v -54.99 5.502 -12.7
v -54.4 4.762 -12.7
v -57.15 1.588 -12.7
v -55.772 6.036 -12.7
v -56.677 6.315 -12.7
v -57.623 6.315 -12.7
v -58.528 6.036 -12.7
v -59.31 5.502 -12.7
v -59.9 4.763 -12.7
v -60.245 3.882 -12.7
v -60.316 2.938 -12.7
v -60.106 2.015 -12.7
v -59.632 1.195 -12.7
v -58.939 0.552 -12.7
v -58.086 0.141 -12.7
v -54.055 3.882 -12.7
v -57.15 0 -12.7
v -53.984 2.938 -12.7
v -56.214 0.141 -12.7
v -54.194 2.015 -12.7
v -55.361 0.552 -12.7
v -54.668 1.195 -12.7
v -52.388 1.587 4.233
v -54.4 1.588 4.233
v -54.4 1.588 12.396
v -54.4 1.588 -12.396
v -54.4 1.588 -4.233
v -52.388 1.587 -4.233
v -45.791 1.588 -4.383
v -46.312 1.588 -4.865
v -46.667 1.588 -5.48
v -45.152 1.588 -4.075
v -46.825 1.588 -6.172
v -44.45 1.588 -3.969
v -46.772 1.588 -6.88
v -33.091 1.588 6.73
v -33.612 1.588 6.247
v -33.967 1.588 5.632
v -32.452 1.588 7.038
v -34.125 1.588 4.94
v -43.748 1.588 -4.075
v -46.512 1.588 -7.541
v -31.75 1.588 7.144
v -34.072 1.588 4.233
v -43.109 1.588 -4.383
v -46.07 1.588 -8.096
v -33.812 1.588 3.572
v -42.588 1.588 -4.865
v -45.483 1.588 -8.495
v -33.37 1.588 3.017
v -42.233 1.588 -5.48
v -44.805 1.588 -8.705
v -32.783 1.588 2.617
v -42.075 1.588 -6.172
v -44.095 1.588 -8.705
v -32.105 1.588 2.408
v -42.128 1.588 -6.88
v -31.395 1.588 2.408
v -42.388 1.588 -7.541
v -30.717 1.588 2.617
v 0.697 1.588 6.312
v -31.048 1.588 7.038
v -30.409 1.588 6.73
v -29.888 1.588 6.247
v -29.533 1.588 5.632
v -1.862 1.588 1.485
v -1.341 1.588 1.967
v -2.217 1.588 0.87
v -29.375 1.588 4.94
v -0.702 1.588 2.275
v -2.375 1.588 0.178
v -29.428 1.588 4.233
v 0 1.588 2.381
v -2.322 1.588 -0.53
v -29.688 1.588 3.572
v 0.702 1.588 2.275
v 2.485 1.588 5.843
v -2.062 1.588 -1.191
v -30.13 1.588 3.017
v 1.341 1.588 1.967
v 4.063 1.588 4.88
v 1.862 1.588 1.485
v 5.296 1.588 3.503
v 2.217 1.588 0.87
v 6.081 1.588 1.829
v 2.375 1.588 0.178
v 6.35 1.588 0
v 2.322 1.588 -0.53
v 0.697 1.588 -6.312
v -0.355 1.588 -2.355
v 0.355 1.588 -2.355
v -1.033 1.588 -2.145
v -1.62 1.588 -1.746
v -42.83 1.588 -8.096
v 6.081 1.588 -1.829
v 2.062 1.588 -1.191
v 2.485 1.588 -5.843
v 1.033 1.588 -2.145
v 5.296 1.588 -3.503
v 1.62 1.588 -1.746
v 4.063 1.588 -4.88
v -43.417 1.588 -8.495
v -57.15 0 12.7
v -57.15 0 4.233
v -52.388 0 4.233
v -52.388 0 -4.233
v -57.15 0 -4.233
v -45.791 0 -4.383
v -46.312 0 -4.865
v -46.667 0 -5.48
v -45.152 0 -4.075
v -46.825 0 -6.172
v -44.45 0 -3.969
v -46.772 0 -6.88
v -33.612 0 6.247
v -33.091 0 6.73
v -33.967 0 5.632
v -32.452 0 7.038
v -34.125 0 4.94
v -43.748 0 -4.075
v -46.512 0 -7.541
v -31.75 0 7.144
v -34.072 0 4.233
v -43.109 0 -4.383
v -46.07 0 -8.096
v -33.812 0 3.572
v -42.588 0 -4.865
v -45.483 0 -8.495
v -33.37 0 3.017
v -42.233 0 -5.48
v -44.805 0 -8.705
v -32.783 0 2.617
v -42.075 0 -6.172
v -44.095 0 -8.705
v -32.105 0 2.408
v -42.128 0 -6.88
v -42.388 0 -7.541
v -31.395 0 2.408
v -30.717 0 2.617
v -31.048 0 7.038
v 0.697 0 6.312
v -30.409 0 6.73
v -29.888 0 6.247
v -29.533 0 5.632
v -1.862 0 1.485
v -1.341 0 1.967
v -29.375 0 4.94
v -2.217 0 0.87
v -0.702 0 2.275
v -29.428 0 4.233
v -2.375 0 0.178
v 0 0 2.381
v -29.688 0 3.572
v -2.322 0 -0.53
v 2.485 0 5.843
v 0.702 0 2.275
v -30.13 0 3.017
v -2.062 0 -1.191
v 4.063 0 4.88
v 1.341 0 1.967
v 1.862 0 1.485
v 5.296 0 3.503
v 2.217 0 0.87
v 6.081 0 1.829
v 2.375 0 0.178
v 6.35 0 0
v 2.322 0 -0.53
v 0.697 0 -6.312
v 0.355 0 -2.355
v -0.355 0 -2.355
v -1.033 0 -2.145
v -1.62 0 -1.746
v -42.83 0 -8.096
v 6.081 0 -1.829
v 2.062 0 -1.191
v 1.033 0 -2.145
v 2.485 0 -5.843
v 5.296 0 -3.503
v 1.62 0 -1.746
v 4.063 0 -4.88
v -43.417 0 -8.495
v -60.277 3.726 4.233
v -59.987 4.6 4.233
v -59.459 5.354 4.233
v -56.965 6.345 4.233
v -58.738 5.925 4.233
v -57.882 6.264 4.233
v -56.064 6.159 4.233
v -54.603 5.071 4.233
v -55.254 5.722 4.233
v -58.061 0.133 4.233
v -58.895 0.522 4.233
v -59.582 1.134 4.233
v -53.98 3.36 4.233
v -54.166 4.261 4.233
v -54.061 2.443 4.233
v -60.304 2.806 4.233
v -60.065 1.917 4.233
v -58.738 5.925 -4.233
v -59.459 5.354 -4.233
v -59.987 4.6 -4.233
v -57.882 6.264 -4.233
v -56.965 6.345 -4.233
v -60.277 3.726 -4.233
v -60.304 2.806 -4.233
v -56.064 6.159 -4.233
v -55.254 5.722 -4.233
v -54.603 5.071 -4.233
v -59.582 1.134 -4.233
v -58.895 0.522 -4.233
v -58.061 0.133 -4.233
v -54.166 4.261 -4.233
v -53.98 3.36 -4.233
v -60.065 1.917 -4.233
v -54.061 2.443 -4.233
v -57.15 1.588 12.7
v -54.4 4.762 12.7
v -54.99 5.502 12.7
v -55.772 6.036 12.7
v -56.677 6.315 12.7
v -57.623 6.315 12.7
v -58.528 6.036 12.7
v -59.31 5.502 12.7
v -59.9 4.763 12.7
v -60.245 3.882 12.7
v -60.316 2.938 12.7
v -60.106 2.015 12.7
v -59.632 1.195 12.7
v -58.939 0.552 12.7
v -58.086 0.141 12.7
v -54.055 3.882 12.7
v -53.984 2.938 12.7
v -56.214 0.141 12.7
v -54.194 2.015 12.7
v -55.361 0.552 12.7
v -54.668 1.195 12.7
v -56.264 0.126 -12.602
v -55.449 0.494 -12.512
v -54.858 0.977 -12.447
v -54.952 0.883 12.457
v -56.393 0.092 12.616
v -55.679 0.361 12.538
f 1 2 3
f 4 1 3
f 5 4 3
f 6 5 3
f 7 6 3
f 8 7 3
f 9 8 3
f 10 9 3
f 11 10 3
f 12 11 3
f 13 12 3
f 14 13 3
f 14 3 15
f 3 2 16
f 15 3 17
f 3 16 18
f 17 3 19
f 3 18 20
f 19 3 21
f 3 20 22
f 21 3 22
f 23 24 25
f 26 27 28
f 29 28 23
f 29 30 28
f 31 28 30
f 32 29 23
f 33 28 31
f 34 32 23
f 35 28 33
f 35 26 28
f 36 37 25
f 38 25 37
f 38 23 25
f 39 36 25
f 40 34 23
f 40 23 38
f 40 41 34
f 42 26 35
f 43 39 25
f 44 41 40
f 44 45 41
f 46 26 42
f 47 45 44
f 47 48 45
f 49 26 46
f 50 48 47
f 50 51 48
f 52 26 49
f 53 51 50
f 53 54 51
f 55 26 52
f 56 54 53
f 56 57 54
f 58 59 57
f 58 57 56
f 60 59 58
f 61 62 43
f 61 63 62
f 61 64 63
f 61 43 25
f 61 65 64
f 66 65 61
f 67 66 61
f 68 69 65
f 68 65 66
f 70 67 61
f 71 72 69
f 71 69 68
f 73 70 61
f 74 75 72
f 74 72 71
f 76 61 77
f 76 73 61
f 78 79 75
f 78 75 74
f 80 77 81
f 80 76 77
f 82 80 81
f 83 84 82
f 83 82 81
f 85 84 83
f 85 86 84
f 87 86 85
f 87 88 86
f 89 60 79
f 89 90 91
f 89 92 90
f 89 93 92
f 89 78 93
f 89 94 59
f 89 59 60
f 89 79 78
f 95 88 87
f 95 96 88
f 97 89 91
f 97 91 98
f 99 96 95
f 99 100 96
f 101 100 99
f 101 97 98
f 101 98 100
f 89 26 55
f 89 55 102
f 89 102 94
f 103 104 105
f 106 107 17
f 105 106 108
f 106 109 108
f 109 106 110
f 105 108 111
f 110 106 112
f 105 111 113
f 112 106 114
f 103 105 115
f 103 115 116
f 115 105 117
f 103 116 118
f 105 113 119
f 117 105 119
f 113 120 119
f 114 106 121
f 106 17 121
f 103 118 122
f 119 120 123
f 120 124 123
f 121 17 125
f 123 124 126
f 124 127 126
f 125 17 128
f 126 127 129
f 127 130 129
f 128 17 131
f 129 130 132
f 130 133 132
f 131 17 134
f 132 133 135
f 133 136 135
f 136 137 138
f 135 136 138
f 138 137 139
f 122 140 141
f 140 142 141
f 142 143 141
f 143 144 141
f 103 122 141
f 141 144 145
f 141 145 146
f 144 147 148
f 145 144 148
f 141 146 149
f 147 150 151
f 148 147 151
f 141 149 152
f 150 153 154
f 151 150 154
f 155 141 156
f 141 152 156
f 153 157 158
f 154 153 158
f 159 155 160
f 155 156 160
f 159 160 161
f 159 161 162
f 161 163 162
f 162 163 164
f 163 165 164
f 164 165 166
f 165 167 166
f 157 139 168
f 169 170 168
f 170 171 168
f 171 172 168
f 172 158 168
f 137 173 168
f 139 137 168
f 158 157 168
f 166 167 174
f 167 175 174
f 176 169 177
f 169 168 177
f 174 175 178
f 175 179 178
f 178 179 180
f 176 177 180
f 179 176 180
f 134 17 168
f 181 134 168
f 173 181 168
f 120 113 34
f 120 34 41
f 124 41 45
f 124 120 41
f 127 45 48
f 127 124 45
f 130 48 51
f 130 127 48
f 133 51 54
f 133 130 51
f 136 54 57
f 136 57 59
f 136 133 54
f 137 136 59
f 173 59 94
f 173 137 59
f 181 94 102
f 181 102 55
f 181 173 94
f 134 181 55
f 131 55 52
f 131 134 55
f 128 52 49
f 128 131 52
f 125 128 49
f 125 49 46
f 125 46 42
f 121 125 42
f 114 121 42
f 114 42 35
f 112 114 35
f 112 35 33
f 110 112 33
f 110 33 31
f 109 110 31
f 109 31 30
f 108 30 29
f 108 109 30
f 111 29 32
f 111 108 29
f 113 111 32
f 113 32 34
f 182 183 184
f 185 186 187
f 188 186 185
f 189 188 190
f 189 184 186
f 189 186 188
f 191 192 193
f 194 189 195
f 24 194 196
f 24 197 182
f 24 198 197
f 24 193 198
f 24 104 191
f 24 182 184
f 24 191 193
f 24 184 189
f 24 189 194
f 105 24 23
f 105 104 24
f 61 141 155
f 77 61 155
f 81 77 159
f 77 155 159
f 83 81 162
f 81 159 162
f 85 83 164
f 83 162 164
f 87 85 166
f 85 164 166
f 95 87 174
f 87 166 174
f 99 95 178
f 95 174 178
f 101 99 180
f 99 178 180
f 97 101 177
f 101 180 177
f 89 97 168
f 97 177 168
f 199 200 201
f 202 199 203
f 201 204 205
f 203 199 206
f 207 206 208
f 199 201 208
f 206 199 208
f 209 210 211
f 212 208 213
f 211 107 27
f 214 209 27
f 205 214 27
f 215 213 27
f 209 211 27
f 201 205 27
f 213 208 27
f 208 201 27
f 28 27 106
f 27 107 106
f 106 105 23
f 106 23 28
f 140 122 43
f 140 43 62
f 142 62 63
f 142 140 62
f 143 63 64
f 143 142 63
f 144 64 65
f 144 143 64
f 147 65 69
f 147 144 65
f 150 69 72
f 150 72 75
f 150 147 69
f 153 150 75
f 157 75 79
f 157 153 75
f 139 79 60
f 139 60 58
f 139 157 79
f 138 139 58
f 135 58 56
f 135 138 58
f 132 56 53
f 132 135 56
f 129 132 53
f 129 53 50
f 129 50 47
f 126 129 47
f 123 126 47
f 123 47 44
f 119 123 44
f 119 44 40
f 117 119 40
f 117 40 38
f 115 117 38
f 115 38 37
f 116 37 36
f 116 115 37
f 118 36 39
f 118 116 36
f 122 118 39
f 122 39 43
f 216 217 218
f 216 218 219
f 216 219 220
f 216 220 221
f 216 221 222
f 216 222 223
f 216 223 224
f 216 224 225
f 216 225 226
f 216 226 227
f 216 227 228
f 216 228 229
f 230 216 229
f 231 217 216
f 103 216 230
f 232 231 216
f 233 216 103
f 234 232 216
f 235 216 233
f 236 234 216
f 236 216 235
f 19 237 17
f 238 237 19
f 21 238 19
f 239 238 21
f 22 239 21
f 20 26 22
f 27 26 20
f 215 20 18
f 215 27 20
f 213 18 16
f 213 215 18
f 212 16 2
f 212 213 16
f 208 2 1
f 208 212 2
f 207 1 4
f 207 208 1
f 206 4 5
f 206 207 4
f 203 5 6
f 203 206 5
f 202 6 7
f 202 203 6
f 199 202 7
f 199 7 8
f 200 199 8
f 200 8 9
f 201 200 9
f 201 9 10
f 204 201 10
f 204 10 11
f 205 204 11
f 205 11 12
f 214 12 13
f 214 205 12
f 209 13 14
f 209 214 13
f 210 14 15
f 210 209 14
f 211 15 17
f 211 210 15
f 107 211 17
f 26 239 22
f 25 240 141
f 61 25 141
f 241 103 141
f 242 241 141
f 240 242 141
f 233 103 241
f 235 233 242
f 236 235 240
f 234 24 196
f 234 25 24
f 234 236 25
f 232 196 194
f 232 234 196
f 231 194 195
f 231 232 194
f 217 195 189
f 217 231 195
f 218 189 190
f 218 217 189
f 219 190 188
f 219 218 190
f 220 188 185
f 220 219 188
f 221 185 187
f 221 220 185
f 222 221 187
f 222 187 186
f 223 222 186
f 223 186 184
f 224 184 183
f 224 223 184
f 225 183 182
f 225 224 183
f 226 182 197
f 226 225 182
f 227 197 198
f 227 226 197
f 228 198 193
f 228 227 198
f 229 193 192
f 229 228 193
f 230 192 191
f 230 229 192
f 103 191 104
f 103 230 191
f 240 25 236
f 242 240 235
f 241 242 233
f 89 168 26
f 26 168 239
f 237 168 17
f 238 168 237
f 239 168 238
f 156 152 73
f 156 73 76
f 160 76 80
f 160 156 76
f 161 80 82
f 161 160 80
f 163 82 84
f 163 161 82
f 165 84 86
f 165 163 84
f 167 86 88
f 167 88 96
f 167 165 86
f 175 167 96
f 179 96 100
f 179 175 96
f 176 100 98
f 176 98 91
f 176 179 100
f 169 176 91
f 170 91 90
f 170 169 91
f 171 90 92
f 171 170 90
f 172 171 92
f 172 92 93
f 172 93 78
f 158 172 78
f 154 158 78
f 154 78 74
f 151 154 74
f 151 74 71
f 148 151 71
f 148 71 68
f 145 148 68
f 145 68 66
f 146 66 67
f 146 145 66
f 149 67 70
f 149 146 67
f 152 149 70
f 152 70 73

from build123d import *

# Parameters (mm, degrees)
SKETCH1_R               = 2.38125
BOSS_EXTRUDE1_DEPTH     = 1.5875
SKETCH2_W               = 25.4
SKETCH2_H               = 3.175
CUT_EXTRUDE1_DEPTH      = 62.831036149
CUT_EXTRUDE1_DEPTH_BACK = 62.831036149
SKETCH3_W               = 7.9375
SKETCH3_H               = 8.466666666


with BuildPart() as part:
    # Sketch1 → Boss-Extrude1 (new body)
    with BuildSketch(Plane(origin=(0, 0, 0), x_dir=(1, 0, 0), z_dir=(0, 1, 0))):
        with BuildLine():
            Line((-57.15, 12.7), (-57.15, -12.7))
            Line((-57.15, -12.7), (0.697028502, -6.311628258))
            ThreePointArc((0.697028502, -6.311628258), (6.35, 0), (0.697028502, 6.311628258))
            Line((0.697028502, 6.311628258), (-57.15, 12.7))
        make_face()
        with Locations(Location((0, 0, 0), (0, 0, 270))):
            Circle(SKETCH1_R, mode=Mode.SUBTRACT)
        with Locations(Location((-44.45, 6.35, 0), (0, 0, 270))):
            Circle(SKETCH1_R, mode=Mode.SUBTRACT)
        with Locations(Location((-31.75, -4.7625, 0), (0, 0, 270))):
            Circle(SKETCH1_R, mode=Mode.SUBTRACT)
    extrude(amount=BOSS_EXTRUDE1_DEPTH)

    # Sketch2 → Revolve1 (revolve)
    with BuildSketch(Plane.ZY.offset(57.15)):
        with Locations((0, 1.5875)):
            Rectangle(SKETCH2_W, SKETCH2_H)
    revolve(axis=Axis((-57.15, 3.175, -12.7), (0, 0, 1)))

    # Sketch3 → Cut-Extrude1 (cut, two sides: drawn at the far end of the back side and taken through both)
    with BuildSketch(Plane(origin=(0, 1.5875, 0), x_dir=(1, 0, 0), z_dir=(0, 1, 0)).offset(-CUT_EXTRUDE1_DEPTH_BACK)):
        with Locations((-56.35625, 0)):
            Rectangle(SKETCH3_W, SKETCH3_H)
    extrude(amount=CUT_EXTRUDE1_DEPTH + CUT_EXTRUDE1_DEPTH_BACK, mode=Mode.SUBTRACT)


solid = part.part
